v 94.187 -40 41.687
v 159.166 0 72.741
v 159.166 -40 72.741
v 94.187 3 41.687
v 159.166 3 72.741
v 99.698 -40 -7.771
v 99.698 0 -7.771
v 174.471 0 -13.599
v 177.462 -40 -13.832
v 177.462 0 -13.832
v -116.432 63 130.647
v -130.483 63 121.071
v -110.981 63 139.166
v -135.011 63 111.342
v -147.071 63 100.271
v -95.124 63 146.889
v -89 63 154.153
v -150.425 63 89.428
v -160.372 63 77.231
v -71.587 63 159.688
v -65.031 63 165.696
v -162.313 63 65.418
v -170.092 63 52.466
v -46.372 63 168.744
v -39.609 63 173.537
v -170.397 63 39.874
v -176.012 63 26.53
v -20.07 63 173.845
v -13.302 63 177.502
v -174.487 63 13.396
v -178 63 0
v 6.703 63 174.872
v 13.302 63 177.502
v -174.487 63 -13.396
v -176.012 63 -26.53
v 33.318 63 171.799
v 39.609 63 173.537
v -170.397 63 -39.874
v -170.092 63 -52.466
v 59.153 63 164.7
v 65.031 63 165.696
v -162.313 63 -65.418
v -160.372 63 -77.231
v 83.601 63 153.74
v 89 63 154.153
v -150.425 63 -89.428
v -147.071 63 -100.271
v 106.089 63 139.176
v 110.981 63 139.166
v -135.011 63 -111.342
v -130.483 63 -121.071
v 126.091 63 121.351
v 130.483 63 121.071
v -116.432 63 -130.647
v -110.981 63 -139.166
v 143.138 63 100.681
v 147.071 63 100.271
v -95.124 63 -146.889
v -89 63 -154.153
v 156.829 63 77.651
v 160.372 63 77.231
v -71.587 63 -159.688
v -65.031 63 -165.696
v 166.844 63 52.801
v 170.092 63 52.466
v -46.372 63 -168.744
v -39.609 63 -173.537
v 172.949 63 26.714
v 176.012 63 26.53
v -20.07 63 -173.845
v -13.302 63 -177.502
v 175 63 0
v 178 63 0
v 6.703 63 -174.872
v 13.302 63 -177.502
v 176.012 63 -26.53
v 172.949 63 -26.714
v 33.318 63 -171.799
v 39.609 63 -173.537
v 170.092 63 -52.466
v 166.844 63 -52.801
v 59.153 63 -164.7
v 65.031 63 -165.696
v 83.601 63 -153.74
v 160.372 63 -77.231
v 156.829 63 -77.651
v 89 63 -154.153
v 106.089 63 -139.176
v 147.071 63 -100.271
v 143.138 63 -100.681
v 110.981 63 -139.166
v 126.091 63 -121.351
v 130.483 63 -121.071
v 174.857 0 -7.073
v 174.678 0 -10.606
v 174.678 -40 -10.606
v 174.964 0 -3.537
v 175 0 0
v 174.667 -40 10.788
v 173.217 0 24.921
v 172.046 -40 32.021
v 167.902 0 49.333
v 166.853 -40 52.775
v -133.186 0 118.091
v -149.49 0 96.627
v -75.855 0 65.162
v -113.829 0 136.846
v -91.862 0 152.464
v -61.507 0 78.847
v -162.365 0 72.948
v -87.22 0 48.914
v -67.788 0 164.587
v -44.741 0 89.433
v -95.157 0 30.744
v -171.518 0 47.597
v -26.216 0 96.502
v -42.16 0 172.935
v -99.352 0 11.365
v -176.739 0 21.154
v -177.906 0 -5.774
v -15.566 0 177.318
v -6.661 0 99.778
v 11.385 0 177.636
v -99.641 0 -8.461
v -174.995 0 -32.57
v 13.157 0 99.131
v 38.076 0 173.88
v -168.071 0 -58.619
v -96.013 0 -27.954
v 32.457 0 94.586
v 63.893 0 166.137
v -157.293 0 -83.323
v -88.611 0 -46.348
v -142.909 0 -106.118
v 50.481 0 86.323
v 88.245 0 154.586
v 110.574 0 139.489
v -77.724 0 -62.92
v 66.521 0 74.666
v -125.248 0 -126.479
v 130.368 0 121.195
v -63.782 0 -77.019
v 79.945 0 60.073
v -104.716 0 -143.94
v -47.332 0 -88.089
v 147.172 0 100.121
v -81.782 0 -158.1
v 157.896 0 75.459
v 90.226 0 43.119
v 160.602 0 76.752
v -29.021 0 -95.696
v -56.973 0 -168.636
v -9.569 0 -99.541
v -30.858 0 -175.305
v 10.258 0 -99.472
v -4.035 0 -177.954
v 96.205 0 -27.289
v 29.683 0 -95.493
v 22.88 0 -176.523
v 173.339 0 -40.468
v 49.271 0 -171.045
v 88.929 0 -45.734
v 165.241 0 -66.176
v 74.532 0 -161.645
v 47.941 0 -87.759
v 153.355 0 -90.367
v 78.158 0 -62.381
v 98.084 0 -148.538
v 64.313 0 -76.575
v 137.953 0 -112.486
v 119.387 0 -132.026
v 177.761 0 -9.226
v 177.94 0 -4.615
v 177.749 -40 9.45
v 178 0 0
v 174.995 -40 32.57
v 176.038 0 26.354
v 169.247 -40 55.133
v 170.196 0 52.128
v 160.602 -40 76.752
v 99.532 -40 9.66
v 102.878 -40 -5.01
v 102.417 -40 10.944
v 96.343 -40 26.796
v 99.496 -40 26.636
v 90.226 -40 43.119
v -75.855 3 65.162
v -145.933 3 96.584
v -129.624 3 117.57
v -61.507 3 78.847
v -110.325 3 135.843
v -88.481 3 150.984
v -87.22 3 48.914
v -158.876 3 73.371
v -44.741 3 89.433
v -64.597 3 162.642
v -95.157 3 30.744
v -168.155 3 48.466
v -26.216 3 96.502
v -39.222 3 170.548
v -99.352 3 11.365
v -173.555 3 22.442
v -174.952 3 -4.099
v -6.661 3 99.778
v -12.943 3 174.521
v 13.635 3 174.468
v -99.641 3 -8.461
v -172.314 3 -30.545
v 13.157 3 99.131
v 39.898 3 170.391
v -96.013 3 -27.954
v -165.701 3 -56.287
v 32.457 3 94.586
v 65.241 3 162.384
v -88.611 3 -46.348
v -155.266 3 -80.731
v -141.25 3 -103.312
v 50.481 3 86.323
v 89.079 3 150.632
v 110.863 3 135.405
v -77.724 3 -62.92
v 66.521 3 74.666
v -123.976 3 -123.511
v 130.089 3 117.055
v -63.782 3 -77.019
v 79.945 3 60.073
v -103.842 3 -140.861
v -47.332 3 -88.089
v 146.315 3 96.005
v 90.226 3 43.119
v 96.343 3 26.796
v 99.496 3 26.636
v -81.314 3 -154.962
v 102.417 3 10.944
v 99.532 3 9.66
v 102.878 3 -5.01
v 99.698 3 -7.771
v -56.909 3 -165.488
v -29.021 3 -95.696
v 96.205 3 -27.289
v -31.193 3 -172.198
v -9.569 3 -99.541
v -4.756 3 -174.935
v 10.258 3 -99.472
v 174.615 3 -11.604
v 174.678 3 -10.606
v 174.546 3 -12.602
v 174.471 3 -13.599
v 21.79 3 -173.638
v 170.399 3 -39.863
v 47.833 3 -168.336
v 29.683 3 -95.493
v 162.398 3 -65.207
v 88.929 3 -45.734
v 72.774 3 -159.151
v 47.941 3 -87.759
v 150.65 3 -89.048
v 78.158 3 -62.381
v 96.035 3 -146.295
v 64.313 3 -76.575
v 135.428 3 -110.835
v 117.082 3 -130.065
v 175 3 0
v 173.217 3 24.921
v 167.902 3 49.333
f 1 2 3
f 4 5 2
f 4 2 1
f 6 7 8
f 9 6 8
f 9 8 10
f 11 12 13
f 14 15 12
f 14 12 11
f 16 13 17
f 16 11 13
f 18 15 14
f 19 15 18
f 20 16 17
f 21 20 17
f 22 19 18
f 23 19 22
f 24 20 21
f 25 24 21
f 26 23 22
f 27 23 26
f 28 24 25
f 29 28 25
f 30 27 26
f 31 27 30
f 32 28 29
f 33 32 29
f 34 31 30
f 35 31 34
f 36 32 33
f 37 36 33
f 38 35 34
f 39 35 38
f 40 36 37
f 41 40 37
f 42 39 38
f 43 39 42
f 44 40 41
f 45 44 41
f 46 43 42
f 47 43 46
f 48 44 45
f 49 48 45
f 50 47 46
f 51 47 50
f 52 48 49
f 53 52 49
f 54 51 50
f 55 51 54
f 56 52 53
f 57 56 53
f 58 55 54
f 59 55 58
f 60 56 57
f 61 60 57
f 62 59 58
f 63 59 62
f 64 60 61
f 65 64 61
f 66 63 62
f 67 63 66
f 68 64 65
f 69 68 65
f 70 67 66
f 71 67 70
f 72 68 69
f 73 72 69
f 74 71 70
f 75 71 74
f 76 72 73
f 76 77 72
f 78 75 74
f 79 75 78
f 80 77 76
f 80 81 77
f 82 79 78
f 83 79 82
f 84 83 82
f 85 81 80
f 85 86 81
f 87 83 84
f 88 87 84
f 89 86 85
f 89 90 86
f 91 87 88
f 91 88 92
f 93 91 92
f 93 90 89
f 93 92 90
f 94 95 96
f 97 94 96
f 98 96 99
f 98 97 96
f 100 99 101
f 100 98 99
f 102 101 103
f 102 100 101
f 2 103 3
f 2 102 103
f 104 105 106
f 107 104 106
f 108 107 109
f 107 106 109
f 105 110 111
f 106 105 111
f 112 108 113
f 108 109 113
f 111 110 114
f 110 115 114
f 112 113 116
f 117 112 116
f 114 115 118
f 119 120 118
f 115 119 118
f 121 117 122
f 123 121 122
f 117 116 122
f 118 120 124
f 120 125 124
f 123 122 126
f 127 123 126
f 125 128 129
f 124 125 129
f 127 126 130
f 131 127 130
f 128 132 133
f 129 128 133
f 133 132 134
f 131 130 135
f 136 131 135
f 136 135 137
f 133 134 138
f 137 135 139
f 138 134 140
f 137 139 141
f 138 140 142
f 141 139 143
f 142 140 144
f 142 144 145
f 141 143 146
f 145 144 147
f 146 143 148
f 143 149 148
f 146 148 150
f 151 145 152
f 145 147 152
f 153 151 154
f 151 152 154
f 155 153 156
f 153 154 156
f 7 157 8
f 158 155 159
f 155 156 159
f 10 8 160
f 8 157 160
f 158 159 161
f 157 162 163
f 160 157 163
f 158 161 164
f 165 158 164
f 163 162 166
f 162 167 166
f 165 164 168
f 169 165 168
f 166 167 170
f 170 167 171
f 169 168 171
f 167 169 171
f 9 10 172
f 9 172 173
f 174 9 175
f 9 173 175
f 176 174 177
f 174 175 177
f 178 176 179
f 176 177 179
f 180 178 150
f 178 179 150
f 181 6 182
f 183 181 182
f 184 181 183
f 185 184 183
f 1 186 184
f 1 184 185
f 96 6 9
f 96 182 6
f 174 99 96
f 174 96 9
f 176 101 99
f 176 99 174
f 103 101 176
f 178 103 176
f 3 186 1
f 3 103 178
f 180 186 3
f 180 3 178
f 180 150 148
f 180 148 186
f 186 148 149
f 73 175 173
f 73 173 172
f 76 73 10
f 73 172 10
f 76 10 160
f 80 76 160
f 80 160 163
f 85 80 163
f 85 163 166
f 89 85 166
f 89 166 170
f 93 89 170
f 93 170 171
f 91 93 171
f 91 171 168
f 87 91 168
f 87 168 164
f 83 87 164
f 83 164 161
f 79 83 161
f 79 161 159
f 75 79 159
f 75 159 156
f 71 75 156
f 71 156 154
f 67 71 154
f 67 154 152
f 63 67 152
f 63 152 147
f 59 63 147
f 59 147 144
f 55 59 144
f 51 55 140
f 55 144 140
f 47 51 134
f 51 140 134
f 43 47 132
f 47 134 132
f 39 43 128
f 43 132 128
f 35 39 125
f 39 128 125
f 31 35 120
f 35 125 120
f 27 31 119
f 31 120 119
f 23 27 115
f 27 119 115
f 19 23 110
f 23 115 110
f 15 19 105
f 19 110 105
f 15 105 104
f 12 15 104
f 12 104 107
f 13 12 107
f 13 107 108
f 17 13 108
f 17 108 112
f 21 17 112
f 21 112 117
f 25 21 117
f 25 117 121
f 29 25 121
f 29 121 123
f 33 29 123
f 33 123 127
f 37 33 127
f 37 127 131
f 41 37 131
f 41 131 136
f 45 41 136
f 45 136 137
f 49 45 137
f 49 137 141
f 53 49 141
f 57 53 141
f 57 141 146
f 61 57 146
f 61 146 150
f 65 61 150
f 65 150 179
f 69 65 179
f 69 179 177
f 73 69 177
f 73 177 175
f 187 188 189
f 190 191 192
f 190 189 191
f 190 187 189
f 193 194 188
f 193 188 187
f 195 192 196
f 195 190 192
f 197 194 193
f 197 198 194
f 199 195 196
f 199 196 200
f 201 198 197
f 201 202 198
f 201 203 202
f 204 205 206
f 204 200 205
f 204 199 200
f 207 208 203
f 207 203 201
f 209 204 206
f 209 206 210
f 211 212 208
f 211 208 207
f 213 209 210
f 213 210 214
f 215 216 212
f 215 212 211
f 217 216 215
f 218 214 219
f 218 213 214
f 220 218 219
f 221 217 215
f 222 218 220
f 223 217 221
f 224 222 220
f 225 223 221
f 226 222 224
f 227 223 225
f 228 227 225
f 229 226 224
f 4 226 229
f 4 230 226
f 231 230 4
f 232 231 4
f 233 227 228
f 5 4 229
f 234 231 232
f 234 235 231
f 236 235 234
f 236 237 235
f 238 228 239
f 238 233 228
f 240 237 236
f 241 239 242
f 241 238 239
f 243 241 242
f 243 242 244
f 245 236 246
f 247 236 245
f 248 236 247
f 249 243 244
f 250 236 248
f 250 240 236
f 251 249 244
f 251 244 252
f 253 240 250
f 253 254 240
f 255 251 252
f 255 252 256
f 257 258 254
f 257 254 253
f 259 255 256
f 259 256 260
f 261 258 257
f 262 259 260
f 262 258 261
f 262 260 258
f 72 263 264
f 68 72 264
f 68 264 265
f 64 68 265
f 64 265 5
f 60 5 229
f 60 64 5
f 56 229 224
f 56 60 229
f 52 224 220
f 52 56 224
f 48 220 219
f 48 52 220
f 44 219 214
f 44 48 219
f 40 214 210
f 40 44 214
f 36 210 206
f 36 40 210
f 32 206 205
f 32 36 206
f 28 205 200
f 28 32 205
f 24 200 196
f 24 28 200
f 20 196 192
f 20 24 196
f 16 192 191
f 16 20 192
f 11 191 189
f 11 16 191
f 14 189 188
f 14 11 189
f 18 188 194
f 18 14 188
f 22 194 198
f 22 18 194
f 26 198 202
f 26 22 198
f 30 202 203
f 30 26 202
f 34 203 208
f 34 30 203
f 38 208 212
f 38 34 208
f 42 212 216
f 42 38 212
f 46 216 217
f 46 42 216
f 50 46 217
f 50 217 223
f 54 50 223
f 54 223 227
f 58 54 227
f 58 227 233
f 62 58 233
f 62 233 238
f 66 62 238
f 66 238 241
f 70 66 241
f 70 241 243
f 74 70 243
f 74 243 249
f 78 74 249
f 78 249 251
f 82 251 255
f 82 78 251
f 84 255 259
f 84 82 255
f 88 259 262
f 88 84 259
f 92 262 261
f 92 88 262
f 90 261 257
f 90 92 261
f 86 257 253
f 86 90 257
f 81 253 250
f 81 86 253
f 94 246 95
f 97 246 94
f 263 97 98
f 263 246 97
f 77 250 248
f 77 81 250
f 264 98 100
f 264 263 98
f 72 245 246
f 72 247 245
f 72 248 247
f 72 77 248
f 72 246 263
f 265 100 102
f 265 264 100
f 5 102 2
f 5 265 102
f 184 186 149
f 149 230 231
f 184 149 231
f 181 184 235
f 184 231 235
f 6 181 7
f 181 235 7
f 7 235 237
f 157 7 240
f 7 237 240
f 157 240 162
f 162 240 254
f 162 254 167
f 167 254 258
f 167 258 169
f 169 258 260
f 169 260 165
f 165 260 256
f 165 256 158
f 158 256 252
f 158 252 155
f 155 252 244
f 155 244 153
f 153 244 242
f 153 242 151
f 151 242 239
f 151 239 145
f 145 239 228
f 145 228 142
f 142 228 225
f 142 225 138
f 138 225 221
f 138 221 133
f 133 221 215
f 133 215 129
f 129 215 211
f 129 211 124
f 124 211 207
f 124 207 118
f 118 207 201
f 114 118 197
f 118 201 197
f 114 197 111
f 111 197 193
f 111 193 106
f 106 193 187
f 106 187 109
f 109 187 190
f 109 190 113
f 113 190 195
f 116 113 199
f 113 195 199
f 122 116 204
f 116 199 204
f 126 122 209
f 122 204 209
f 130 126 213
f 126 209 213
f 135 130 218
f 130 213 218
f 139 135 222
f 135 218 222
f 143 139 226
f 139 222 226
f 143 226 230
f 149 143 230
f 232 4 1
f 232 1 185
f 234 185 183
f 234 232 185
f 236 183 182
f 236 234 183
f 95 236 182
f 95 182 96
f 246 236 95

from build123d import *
from build123d.topology import SkipClean

# Parameters (mm, degrees)
SKETCH2_R                 = 178
SKETCH2_R_2               = 100
BOSS_EXTRUDE1_DEPTH       = 3
SKETCH3_R                 = 178
SKETCH3_R_2               = 175
BOSS_EXTRUDE2_DEPTH       = 60
CUT_EXTRUDE2_START        = -25
CUT_EXTRUDE2_DEPTH        = 25
BOSS_EXTRUDE17_DEPTH      = 40
BOSS_EXTRUDE17_DEPTH_BACK = 3


with BuildPart() as part:
    # Sketch2 → Boss-Extrude1 (new body)
    with BuildSketch(Plane(origin=(0, 0, 0), x_dir=(1, 0, 0), z_dir=(0, 1, 0))):
        Circle(SKETCH2_R)
        Circle(SKETCH2_R_2, mode=Mode.SUBTRACT)
    extrude(amount=BOSS_EXTRUDE1_DEPTH)

    # Sketch3 → Boss-Extrude2 (add)
    with BuildSketch(Plane(origin=(0, 3, 0), x_dir=(1, 0, 0), z_dir=(0, 1, 0))):
        Circle(SKETCH3_R)
        Circle(SKETCH3_R_2, mode=Mode.SUBTRACT)
    extrude(amount=BOSS_EXTRUDE2_DEPTH)

    # Sketch5 → Cut-Extrude2 (cut)
    with BuildSketch(Plane(origin=(0, 3, 0), x_dir=(1, 0, 0), z_dir=(0, 1, 0)).offset(CUT_EXTRUDE2_START)):
        with BuildLine():
            Line((174.470835958, 13.59880142), (99.697620548, 7.770743669))
            ThreePointArc((99.697620548, 7.770743669), (99.924376542, 3.888312311), (100, 0))
            ThreePointArc((100, 0), (97.525905257, -22.106510438), (90.226043925, -43.11914885))
            Line((90.226043925, -43.11914885), (157.895576869, -75.458510488))
            ThreePointArc((157.895576869, -75.458510488), (170.6703342, -38.686393266), (175, 0))
            ThreePointArc((175, 0), (174.867658949, 6.804546543), (174.470835958, 13.59880142))
        make_face()
    extrude(amount=CUT_EXTRUDE2_DEPTH, mode=Mode.SUBTRACT)

    # Sketch16 → Boss-Extrude17 (add, two sides: drawn at the far end of the back side and taken through both)
    with SkipClean():  # the faces are left unmerged after this step: merging them gives an invalid solid
        with BuildSketch(Plane.XZ.offset(-BOSS_EXTRUDE17_DEPTH_BACK)):
            with BuildLine():
                Line((160.602358187, 76.752084954), (90.226043925, 43.11914885))
                ThreePointArc((90.226043925, 43.11914885), (98.311722962, 18.29768095), (99.697620548, -7.770743669))
                Line((99.697620548, -7.770743669), (177.461764575, -13.83192373))
                ThreePointArc((177.461764575, -13.83192373), (174.994866873, 32.569872091), (160.602358187, 76.752084954))
            make_face()
            with BuildLine():
                Line((159.165948647, 72.740640575), (94.186972199, 41.687099538))
                ThreePointArc((94.186972199, 41.687099538), (101.261074651, 18.846611379), (102.878105019, -5.009541657))
                Line((102.878105019, -5.009541657), (174.678319853, -10.605874466))
                ThreePointArc((174.678319853, -10.605874466), (172.045515184, 32.020941663), (159.165948647, 72.740640575))
            make_face(mode=Mode.SUBTRACT)
        extrude(amount=BOSS_EXTRUDE17_DEPTH + BOSS_EXTRUDE17_DEPTH_BACK)


solid = part.part
